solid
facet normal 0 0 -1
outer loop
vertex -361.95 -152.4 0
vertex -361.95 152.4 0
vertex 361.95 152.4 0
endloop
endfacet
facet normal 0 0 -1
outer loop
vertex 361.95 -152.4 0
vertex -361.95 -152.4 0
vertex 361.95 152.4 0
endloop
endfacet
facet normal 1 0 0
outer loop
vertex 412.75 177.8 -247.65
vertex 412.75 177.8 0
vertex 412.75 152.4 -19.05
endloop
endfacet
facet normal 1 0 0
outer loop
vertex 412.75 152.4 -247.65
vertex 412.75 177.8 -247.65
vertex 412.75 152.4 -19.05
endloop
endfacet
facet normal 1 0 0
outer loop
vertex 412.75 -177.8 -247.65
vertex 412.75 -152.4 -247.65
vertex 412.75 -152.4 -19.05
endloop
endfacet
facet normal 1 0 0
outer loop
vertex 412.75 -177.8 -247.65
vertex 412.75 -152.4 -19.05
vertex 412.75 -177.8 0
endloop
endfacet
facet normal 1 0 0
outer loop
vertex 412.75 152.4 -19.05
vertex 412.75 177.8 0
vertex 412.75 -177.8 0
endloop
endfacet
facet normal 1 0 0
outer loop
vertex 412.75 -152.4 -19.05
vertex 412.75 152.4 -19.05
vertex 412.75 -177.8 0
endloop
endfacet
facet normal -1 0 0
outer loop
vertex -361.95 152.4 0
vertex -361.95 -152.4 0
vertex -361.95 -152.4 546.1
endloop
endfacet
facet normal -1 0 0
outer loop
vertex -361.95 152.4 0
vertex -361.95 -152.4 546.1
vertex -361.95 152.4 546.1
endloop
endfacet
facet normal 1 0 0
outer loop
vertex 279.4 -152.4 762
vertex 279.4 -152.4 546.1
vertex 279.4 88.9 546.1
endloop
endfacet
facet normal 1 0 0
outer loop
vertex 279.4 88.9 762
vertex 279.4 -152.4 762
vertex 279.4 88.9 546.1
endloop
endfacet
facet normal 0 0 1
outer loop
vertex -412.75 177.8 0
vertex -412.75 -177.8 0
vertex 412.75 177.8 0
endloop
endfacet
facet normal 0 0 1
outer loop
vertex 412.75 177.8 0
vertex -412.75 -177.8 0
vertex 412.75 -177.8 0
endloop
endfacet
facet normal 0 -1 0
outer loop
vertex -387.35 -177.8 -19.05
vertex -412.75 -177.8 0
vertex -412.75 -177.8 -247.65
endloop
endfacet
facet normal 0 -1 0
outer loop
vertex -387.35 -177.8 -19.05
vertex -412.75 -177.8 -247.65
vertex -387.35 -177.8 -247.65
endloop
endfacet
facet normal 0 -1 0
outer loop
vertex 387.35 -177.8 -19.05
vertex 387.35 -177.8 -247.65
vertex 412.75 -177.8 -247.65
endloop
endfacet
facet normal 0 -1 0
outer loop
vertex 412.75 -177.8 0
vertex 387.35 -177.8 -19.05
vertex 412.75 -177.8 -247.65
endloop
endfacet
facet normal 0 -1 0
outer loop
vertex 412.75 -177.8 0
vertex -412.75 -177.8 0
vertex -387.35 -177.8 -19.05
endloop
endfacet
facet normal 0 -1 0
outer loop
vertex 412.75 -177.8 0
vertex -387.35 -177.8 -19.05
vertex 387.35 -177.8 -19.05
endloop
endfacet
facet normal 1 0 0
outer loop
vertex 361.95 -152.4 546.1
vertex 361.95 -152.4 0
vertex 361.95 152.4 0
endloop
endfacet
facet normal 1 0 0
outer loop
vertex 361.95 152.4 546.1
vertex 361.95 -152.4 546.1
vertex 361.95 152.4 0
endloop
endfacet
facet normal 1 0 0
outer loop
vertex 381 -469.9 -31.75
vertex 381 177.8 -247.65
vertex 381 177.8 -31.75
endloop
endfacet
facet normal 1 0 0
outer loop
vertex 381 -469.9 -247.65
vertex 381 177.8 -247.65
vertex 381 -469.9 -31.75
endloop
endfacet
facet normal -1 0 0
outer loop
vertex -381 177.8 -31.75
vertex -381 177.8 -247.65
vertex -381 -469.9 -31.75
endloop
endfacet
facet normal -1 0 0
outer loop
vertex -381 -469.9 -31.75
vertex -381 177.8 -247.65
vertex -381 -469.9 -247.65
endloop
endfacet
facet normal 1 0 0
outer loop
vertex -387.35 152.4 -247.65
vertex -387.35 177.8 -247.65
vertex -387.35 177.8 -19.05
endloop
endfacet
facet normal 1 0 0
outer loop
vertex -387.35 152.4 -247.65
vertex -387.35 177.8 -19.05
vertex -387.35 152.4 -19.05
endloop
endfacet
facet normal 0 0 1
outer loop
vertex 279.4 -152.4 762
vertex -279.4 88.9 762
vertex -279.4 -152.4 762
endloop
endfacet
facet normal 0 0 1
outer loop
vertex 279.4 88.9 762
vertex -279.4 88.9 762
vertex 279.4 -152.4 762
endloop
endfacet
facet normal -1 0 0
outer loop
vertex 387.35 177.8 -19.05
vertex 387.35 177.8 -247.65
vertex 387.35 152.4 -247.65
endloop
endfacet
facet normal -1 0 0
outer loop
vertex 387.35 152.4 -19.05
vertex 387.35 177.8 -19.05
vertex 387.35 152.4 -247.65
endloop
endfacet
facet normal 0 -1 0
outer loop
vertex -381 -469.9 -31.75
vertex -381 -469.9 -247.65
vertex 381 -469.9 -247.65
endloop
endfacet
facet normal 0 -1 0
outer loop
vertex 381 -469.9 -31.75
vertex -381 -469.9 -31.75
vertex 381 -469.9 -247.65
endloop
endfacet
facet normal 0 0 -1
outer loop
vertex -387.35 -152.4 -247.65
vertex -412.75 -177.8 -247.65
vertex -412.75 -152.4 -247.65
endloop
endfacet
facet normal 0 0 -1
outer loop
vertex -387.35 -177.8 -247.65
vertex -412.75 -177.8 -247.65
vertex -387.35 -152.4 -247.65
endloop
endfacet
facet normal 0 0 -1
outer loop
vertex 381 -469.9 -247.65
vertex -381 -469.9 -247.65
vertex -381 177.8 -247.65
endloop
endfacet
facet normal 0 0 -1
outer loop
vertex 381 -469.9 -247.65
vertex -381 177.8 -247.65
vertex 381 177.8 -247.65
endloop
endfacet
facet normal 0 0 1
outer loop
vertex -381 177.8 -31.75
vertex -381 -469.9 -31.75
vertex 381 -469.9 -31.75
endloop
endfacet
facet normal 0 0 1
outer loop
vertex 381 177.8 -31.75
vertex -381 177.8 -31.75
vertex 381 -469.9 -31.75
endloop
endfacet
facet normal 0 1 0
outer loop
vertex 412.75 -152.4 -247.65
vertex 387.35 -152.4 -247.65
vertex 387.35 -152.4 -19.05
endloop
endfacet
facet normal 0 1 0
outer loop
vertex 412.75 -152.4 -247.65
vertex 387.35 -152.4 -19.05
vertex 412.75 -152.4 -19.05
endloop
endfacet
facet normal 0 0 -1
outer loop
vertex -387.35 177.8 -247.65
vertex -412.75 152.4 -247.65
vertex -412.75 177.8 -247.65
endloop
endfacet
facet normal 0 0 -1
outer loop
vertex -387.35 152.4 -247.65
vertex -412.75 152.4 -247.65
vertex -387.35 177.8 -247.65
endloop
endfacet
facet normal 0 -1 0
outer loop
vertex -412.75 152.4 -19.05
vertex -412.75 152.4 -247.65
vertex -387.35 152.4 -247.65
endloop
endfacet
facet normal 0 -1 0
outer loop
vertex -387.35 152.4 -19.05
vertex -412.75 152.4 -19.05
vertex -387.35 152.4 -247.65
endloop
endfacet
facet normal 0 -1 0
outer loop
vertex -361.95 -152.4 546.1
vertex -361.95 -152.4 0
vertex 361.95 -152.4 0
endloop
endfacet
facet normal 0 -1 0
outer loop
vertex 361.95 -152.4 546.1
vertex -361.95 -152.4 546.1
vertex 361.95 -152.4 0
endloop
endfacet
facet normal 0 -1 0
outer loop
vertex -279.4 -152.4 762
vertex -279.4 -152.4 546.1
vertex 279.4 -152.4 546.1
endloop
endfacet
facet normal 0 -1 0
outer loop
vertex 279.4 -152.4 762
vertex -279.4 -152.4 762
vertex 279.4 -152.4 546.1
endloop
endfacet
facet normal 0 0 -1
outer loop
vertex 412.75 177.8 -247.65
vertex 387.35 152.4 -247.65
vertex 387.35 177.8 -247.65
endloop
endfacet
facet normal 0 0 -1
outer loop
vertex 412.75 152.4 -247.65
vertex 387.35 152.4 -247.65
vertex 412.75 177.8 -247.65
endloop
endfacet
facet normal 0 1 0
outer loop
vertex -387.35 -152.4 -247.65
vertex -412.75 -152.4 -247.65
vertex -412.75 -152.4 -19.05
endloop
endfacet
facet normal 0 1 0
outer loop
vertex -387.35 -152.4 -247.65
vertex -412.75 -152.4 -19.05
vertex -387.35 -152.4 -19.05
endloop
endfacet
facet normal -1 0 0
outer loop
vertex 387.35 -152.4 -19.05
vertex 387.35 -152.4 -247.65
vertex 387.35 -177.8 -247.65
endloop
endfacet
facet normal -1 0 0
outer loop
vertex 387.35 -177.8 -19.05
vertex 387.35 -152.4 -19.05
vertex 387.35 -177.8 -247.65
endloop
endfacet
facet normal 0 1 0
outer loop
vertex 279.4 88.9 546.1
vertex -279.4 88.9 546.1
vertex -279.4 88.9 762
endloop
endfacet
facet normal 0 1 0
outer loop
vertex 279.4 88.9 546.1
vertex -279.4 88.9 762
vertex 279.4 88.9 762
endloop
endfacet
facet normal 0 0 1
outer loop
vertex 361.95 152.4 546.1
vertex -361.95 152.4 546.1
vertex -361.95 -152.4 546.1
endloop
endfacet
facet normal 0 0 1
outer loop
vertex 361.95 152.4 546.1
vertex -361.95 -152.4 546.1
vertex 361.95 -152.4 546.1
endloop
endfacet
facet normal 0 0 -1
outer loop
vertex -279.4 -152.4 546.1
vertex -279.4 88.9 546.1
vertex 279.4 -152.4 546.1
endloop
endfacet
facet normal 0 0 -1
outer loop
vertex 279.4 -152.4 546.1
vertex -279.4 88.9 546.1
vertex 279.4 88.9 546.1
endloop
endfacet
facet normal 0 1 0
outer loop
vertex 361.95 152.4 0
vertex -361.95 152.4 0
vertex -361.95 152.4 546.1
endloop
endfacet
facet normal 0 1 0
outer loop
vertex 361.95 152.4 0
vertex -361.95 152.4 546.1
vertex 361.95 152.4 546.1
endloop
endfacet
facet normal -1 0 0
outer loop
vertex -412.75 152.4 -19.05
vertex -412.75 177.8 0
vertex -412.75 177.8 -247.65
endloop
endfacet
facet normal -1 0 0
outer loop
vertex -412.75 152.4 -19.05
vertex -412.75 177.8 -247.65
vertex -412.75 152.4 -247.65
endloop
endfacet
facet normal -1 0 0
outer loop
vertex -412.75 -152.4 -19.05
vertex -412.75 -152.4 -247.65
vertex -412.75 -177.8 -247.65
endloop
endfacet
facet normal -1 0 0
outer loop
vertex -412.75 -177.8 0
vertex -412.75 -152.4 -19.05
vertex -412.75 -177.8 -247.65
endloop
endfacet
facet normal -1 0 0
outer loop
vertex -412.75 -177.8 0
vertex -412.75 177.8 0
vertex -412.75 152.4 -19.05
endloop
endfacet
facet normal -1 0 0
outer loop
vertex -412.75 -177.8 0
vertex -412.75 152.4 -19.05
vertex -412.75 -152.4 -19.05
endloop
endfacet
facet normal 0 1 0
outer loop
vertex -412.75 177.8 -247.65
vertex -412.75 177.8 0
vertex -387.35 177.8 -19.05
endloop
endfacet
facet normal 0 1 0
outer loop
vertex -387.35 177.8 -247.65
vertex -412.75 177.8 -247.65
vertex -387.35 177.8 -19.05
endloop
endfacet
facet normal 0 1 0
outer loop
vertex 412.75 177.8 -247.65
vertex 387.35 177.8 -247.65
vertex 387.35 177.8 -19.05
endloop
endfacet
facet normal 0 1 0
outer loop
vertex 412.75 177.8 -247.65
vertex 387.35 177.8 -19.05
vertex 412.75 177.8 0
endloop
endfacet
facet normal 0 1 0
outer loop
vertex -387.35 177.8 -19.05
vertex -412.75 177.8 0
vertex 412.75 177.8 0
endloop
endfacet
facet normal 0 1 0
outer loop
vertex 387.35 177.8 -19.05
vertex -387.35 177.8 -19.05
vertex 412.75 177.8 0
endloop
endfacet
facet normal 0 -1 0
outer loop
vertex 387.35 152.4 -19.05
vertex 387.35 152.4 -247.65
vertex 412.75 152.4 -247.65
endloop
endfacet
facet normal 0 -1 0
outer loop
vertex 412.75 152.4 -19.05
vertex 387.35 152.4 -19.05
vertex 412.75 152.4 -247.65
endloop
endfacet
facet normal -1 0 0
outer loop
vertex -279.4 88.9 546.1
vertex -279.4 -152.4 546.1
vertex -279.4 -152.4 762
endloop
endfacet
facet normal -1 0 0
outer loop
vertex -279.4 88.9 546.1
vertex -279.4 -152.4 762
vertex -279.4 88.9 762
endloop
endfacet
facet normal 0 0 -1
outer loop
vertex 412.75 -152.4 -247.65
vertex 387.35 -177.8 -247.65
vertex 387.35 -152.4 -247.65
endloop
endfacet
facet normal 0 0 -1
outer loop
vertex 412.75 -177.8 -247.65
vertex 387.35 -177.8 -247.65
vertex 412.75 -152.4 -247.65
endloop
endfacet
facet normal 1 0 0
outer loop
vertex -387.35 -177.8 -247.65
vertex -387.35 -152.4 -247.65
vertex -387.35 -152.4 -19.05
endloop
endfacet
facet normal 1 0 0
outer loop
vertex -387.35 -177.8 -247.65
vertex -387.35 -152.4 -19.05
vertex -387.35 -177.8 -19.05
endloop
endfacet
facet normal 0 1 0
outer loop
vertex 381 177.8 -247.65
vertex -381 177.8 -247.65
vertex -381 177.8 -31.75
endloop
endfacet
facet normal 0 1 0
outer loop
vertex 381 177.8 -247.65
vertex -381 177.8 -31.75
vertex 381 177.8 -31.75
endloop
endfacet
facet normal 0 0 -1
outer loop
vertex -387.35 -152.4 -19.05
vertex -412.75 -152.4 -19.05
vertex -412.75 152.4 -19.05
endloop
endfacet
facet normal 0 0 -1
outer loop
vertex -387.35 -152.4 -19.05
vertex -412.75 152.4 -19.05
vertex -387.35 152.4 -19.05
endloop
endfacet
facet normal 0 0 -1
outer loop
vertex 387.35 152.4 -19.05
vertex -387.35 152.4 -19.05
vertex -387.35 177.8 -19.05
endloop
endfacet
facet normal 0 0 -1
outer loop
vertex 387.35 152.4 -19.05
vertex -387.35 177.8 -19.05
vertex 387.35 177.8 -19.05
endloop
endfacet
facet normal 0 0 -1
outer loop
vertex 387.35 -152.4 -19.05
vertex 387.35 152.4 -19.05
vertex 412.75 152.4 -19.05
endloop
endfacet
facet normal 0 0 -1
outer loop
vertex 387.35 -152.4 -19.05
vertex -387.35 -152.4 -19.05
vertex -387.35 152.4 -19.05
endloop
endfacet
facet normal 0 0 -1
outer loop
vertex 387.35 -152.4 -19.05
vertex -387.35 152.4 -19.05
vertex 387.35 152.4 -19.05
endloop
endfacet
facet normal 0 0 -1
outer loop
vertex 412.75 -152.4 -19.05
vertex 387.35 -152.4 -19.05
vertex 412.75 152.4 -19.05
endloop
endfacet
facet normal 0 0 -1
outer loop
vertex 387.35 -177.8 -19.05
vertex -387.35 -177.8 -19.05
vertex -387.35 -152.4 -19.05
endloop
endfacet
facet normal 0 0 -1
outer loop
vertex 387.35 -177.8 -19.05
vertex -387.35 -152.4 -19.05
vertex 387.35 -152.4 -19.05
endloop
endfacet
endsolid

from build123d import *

# Parameters (mm, degrees)
F0_W     = 723.9
F0_H     = 304.8
F1_DEPTH = 546.1
F2_W     = 558.8
F2_H     = 241.3
F3_DEPTH = 215.9
F4_W     = 825.5
F4_H     = 355.6
F5_DEPTH = 19.05
F6_W     = 25.4
F6_H     = 25.4
F7_DEPTH = 228.6
F8_W     = 762
F8_H     = 647.7
F9_DEPTH = 215.9


with BuildPart() as f1:
    # F0 (on Top) → F1 (new body)
    with BuildSketch(Plane.XY):
        Rectangle(F0_W, F0_H)
    extrude(amount=F1_DEPTH)


with BuildPart() as f3:
    # F2 (on face) → F3 (new body)
    with BuildSketch(Plane.XY.offset(546.1)):
        with Locations((0, -31.75)):
            Rectangle(F2_W, F2_H)
    extrude(amount=F3_DEPTH)


with BuildPart() as f5:
    # F4 (on face) → F5 (new body)
    with BuildSketch(Plane(origin=(0, 0, 0), x_dir=(1, 0, 0), z_dir=(0, 0, -1))):
        Rectangle(F4_W, F4_H)
    extrude(amount=F5_DEPTH)

    # F6 (on face) → F7 (join)
    with BuildSketch(Plane(origin=(0, 0, -19.05), x_dir=(1, 0, 0), z_dir=(0, 0, -1))):
        with Locations((-400.05, 165.1)):
            Rectangle(F6_W, F6_H)
        with Locations((-400.05, -165.1)):
            Rectangle(F6_W, F6_H)
        with Locations((400.05, -165.1)):
            Rectangle(F6_W, F6_H)
        with Locations((400.05, 165.1)):
            Rectangle(F6_W, F6_H)
    extrude(amount=F7_DEPTH)


with BuildPart() as f9:
    # F8 (on face) → F9 (new body)
    with BuildSketch(Plane(origin=(0, 0, -247.65), x_dir=(1, 0, 0), z_dir=(0, 0, -1))):
        with Locations((0, 146.05)):
            Rectangle(F8_W, F8_H)
    extrude(amount=-F9_DEPTH)


solid = Compound([f1.part, f3.part, f5.part, f9.part])
